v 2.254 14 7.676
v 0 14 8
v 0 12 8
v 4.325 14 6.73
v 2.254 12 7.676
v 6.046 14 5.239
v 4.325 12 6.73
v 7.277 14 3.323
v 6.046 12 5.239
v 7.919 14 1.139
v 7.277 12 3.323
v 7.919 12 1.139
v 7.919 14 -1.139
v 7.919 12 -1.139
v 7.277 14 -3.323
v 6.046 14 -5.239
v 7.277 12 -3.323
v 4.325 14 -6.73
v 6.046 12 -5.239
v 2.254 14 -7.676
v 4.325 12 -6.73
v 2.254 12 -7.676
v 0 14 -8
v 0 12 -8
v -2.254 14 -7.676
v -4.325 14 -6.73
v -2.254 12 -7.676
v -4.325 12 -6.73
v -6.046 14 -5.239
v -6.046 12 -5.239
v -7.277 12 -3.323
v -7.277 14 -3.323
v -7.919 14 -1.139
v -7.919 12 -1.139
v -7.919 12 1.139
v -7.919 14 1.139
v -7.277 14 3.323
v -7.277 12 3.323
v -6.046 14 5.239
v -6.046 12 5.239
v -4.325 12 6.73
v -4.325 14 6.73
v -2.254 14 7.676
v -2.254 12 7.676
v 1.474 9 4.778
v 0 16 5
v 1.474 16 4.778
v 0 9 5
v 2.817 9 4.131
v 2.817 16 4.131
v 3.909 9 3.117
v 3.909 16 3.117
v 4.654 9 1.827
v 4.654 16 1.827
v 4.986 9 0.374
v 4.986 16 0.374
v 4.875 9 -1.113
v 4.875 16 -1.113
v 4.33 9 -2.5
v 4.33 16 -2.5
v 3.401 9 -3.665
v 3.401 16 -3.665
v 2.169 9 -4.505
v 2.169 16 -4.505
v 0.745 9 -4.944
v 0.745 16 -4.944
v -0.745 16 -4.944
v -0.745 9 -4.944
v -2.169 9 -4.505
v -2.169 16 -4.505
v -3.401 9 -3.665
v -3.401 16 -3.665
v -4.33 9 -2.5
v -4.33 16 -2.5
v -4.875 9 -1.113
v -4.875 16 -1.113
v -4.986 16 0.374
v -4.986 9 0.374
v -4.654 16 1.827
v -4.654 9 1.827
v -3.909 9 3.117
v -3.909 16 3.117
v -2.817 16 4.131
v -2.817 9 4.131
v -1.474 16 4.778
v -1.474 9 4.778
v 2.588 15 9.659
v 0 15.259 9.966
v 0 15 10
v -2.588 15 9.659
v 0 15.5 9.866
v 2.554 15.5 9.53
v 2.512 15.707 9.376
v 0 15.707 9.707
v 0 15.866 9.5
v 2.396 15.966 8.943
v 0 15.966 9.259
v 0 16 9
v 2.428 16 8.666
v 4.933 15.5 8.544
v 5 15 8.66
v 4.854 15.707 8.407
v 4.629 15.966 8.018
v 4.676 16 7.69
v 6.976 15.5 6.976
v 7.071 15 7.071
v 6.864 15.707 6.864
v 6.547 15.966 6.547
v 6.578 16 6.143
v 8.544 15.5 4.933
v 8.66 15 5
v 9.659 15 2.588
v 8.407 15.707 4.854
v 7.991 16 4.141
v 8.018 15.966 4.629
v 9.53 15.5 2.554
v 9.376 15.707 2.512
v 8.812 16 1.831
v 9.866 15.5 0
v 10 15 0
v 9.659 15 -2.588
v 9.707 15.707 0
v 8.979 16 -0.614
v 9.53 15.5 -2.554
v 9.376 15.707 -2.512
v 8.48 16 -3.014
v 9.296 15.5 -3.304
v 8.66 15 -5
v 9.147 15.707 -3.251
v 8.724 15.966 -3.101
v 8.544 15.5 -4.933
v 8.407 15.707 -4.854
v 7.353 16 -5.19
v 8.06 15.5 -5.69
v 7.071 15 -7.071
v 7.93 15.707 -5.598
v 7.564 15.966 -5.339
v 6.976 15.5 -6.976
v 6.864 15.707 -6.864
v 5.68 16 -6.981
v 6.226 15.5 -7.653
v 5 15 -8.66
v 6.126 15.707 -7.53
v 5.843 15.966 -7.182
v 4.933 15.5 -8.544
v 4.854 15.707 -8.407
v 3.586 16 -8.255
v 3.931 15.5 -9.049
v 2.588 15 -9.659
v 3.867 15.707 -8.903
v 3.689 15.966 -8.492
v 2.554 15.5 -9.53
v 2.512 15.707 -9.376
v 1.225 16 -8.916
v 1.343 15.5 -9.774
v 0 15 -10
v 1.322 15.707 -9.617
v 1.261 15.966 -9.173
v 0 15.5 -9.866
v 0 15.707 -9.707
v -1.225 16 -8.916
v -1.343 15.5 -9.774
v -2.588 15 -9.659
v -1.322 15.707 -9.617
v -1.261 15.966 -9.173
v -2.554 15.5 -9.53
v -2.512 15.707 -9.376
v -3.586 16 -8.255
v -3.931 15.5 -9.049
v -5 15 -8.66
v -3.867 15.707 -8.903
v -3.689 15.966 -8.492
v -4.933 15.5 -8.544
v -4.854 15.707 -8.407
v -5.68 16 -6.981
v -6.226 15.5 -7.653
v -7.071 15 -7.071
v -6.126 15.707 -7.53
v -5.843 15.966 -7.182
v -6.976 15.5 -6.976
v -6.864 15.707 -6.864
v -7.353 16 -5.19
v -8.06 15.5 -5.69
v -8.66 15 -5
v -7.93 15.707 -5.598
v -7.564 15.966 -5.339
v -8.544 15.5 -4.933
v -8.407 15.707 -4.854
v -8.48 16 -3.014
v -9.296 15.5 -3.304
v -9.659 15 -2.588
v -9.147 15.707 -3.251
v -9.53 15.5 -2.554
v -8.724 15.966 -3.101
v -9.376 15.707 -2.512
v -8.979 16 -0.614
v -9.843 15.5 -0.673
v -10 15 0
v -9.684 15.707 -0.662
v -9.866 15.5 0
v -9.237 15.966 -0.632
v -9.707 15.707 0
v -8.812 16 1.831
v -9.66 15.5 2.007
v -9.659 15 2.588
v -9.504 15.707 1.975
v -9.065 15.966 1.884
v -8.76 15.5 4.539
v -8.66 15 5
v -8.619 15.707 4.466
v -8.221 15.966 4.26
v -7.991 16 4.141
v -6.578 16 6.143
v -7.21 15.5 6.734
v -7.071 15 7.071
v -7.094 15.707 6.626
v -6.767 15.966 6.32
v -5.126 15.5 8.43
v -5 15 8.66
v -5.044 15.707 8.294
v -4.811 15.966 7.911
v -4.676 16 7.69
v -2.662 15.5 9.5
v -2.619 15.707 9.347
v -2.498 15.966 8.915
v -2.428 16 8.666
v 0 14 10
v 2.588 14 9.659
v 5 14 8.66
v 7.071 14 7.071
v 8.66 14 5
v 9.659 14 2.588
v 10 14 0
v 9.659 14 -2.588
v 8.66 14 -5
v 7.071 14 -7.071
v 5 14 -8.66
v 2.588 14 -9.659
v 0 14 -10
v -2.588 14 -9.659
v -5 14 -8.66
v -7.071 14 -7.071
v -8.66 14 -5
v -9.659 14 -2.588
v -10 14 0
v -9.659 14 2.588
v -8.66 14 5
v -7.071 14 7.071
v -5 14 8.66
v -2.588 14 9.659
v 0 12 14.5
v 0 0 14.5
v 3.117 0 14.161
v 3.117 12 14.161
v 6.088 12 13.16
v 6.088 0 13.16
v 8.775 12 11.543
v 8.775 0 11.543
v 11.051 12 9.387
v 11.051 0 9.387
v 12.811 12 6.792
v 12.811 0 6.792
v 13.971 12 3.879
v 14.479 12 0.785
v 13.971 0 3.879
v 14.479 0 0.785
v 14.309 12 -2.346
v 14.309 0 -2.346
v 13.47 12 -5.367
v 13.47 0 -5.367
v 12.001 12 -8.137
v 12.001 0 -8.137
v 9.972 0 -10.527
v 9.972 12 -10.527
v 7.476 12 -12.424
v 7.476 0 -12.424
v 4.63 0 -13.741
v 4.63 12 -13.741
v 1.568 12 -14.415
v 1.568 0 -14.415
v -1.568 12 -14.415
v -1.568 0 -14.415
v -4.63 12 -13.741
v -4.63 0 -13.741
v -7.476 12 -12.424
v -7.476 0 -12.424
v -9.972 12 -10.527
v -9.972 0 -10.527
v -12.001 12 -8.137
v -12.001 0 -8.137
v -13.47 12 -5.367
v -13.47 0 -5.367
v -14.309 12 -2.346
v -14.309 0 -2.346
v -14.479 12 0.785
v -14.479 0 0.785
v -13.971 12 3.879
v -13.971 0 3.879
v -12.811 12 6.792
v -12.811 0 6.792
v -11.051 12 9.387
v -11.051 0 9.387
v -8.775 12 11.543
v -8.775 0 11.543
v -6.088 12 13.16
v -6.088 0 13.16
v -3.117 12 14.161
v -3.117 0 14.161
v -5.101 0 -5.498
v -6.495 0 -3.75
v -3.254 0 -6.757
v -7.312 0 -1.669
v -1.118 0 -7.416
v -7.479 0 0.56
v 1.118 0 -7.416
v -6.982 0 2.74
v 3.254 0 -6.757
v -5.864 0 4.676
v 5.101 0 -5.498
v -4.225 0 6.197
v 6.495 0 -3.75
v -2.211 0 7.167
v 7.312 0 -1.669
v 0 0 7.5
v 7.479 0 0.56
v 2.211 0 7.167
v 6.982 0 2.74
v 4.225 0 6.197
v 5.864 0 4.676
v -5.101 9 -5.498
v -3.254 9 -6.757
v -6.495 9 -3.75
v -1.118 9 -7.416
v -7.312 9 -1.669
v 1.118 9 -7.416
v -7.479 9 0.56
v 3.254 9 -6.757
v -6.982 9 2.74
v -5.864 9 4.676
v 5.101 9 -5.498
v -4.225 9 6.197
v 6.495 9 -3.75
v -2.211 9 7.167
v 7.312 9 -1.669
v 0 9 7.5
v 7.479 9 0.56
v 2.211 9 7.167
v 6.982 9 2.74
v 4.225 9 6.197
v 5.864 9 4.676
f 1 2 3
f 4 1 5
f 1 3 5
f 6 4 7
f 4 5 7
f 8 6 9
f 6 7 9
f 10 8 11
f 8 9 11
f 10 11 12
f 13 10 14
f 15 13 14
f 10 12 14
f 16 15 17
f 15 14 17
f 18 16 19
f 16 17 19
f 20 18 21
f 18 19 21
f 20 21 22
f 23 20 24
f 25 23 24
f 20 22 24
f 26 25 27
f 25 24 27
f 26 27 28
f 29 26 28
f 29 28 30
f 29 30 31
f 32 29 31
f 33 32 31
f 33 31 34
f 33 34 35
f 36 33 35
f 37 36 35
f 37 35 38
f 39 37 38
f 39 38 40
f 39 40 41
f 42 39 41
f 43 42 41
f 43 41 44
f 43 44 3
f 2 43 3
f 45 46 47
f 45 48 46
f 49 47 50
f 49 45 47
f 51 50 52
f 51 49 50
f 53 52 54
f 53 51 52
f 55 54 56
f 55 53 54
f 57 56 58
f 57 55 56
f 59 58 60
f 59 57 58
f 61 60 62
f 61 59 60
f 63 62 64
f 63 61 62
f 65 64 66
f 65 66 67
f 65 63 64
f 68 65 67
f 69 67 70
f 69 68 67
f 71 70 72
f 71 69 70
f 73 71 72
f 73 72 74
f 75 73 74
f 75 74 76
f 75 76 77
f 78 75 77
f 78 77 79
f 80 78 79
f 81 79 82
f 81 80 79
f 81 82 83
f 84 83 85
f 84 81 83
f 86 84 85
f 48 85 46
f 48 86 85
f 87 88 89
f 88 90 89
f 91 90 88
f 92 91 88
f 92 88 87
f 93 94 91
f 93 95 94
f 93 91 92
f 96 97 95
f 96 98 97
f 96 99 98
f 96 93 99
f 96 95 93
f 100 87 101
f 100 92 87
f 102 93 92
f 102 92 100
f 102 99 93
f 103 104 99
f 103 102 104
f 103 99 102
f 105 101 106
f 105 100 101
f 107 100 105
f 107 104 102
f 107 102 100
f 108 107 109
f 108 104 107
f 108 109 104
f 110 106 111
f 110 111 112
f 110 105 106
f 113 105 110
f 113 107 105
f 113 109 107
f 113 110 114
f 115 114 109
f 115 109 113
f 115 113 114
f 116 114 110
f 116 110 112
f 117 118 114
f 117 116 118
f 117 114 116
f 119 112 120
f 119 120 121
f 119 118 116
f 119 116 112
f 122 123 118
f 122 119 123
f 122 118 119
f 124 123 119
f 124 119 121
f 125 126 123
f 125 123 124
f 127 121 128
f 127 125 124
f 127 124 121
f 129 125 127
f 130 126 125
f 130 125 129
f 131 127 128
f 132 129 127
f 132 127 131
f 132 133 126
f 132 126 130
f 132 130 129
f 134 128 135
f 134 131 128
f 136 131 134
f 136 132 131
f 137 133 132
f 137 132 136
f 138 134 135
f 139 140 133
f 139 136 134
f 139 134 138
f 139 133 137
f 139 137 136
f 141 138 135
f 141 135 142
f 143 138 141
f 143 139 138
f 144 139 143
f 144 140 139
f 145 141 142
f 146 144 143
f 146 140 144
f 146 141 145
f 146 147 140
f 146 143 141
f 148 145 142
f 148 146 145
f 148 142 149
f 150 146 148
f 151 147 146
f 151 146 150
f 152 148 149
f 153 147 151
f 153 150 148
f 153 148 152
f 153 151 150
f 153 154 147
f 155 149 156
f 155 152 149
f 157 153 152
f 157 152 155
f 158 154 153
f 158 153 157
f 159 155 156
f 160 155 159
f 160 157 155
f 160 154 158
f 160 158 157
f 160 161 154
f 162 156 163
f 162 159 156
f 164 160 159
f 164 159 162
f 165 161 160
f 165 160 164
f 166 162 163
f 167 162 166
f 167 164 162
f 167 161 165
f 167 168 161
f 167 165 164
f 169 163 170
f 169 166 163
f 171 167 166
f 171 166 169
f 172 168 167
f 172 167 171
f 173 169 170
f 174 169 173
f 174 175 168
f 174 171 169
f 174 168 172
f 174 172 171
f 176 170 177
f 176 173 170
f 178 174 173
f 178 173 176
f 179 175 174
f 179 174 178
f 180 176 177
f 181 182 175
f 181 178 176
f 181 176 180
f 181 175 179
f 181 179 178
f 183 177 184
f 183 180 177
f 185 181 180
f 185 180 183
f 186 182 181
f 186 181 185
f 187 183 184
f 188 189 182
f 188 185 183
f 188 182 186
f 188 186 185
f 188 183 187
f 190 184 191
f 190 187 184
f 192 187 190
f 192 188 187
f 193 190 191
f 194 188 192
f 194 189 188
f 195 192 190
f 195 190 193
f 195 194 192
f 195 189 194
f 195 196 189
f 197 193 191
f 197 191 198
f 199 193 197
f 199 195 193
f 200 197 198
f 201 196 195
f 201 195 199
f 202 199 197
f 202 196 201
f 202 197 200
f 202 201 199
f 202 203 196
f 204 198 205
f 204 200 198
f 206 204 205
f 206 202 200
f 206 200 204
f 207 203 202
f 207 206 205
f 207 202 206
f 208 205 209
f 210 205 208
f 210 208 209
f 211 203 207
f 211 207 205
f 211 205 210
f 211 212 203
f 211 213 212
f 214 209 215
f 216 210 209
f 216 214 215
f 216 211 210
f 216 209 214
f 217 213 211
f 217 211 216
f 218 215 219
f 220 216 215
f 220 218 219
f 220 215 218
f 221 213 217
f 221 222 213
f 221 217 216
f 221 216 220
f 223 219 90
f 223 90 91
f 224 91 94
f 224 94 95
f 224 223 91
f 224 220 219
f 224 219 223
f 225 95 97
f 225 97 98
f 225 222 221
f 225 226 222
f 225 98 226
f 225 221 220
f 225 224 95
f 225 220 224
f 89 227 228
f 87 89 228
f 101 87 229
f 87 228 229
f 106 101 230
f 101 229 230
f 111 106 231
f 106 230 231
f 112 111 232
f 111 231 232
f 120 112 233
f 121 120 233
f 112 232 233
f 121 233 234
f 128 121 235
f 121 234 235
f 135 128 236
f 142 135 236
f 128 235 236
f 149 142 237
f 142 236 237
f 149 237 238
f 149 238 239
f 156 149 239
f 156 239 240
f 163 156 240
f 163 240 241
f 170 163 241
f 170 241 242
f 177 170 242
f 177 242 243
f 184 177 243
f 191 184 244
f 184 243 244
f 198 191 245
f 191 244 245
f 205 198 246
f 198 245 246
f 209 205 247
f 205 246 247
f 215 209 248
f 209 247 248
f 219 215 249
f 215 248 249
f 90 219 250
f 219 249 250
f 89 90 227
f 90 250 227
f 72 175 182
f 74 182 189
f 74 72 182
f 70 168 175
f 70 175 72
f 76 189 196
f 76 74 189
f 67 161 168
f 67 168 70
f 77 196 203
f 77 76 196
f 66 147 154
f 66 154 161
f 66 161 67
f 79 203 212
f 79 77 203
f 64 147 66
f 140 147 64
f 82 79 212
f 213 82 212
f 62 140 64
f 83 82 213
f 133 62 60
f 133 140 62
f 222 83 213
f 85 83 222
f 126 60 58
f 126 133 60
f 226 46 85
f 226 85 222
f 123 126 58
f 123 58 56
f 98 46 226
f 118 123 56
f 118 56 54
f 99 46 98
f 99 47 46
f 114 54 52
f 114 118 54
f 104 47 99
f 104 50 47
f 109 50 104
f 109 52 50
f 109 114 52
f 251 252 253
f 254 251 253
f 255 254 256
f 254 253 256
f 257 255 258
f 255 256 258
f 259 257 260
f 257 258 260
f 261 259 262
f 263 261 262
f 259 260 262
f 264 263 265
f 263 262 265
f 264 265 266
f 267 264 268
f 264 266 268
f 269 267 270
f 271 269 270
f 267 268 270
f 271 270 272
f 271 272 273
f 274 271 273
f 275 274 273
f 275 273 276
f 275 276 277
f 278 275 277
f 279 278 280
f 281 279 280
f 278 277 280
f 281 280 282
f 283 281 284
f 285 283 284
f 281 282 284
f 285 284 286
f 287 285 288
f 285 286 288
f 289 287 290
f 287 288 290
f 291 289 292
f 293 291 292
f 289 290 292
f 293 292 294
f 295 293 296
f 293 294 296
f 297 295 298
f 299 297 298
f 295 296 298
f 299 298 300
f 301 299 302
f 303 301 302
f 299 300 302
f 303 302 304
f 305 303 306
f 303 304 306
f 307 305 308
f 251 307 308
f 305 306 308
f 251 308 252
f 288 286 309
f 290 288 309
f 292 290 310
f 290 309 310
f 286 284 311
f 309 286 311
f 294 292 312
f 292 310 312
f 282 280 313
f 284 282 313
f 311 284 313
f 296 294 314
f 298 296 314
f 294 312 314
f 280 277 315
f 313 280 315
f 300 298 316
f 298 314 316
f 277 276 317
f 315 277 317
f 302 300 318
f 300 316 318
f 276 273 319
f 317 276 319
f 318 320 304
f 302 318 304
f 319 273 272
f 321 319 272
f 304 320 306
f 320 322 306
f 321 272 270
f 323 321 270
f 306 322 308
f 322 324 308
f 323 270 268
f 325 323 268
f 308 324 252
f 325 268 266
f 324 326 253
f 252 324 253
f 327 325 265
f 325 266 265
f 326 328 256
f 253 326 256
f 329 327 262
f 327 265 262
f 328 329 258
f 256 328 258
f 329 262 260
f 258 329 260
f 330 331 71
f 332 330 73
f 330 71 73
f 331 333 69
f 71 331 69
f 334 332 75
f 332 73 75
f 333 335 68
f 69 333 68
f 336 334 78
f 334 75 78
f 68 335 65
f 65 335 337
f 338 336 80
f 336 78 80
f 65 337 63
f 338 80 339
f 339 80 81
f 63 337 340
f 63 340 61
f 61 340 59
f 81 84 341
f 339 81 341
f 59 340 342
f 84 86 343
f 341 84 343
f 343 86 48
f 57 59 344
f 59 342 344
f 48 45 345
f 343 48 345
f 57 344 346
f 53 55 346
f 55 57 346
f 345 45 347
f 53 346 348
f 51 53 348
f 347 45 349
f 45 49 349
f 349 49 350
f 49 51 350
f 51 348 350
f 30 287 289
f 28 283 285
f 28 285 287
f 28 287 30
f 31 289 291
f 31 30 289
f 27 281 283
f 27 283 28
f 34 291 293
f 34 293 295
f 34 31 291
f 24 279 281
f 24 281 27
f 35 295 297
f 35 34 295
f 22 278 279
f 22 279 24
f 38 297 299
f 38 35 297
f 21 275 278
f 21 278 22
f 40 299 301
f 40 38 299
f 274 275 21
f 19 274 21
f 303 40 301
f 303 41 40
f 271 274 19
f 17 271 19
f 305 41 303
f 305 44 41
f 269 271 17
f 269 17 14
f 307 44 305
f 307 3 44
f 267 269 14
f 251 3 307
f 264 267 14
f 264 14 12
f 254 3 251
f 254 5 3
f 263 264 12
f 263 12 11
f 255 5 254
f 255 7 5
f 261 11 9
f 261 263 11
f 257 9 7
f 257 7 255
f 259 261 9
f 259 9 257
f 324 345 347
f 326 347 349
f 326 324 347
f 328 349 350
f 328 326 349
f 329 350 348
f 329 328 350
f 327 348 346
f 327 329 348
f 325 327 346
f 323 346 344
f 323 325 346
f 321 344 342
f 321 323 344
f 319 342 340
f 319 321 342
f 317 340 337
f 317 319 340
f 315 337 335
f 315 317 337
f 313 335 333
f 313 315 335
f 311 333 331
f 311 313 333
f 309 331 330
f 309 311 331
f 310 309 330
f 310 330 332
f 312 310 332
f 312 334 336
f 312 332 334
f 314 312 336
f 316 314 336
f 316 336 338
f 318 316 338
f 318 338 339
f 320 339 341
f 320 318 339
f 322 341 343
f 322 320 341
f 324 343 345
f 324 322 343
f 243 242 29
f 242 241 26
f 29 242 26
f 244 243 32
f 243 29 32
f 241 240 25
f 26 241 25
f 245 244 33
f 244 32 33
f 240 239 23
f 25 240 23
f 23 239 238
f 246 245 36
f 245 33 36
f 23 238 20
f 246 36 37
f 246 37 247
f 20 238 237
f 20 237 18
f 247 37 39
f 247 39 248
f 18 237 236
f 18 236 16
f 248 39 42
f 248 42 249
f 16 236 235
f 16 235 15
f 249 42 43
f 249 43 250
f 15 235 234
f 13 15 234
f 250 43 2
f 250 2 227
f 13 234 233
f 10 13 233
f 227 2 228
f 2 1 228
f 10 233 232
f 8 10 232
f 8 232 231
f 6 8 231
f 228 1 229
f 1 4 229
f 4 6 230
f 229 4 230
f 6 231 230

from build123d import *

# Parameters (mm, degrees)
SKETCH_1_R           = 14.5
SKETCH_1_R_2         = 7.5
EXTRUDE_1_DEPTH      = 12
EXTRUDE_2_DEPTH      = 2
EXTRUDE_2_DEPTH_BACK = 3
SKETCH_2_R           = 8
SKETCH_2_R_2         = 5
SKETCH_3_R           = 10
SKETCH_3_R_2         = 5
EXTRUDE_3_DEPTH      = 2
FILLET_1_R           = 1


with BuildPart() as part:
    # Эскиз1 → Бобышка-Вытянуть1 (new body)
    with BuildSketch(Plane(origin=(0, 0, 0), x_dir=(1, 0, 0), z_dir=(0, 1, 0))):
        with Locations(Location((0, 0, 0), (0, 0, 270))):
            Circle(SKETCH_1_R)
        with Locations(Location((0, 0, 0), (0, 0, 270))):
            Circle(SKETCH_1_R_2, mode=Mode.SUBTRACT)
    extrude(amount=EXTRUDE_1_DEPTH)

    # Эскиз2 → Бобышка-Вытянуть2 (add, two sides: drawn at the far end of the back side and taken through both)
    with BuildSketch(Plane(origin=(0, 12, 0), x_dir=(1, 0, 0), z_dir=(0, 1, 0)).offset(-EXTRUDE_2_DEPTH_BACK)):
        with Locations(Location((0, 0, 0), (0, 0, 270))):
            Circle(SKETCH_2_R)
        with Locations(Location((0, 0, 0), (0, 0, 270))):
            Circle(SKETCH_2_R_2, mode=Mode.SUBTRACT)
    extrude(amount=EXTRUDE_2_DEPTH + EXTRUDE_2_DEPTH_BACK)

    # Эскиз3 → Бобышка-Вытянуть3 (add)
    with BuildSketch(Plane(origin=(0, 14, 0), x_dir=(1, 0, 0), z_dir=(0, 1, 0))):
        with Locations(Location((0, 0, 0), (0, 0, 270))):
            Circle(SKETCH_3_R)
        with Locations(Location((0, 0, 0), (0, 0, 270))):
            Circle(SKETCH_3_R_2, mode=Mode.SUBTRACT)
    extrude(amount=EXTRUDE_3_DEPTH)

    # Скругление1
    fillet_1_edges = [part.edges().sort_by_distance(p)[0] for p in [
        (0, 16, -10),
    ]]
    fillet(fillet_1_edges, radius=FILLET_1_R)


solid = part.part
